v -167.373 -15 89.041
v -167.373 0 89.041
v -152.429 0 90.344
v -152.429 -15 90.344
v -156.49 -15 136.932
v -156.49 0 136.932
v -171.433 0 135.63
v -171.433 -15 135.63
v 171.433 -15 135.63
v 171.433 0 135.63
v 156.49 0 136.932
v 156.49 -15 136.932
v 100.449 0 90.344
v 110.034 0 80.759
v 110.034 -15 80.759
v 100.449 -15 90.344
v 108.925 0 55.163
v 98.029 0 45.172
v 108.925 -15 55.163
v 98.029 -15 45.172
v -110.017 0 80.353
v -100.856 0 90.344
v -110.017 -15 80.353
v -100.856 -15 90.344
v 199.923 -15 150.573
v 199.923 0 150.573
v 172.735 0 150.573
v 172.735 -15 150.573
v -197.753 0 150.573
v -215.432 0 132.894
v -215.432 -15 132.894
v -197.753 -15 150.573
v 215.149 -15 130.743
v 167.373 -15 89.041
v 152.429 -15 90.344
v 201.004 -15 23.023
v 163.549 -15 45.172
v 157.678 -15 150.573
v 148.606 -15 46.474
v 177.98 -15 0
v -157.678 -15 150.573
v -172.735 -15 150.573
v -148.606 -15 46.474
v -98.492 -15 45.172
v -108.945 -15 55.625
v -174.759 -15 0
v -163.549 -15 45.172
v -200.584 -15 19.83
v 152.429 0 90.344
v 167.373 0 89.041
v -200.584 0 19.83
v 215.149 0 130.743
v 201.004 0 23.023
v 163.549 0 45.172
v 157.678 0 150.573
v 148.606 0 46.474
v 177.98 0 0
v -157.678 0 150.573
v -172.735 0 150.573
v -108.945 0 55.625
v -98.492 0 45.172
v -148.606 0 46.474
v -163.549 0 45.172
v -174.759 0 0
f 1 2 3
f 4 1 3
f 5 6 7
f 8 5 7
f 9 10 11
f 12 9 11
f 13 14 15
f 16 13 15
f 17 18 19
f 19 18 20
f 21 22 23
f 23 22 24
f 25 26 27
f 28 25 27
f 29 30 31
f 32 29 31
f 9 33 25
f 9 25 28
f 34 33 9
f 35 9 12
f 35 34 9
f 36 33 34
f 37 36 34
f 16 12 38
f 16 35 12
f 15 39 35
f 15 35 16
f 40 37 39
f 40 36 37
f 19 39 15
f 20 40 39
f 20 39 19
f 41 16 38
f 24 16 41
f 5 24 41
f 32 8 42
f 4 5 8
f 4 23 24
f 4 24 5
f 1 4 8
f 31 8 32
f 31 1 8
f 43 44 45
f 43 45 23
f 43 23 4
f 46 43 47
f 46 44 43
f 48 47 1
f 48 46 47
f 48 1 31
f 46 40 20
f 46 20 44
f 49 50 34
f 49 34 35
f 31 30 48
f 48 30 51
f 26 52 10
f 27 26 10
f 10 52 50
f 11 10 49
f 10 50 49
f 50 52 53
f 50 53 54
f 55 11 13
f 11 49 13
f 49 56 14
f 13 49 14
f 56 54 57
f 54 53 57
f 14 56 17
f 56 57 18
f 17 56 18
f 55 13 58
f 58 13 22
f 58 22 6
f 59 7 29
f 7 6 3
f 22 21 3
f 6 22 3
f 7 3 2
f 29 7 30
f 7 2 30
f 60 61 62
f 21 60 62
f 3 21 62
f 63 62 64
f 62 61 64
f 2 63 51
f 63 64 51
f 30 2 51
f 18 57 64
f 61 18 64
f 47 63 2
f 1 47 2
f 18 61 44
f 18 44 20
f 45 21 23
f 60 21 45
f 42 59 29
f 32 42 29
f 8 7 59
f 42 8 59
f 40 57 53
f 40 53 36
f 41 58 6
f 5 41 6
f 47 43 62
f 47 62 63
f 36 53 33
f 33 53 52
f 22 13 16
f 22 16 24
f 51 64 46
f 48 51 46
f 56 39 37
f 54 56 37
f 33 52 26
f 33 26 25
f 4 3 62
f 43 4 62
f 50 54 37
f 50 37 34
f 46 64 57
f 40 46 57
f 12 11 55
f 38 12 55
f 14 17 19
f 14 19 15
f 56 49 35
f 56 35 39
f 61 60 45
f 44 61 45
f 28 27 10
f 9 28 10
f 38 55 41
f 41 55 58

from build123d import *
from OCP.BRepFilletAPI import BRepFilletAPI_MakeChamfer

# Parameters (mm, degrees)
BOSS_EXTRUDE1_DEPTH = 15
CHAMFER1_SIZE       = 10
CHAMFER1_SIZE2      = 10.462732323
CHAMFER1_SIZE2_2    = 9.593689253
CHAMFER2_SIZE       = 20
CHAMFER2_SIZE2      = 23.221000733
CHAMFER2_SIZE2_2    = 17.830293244


with BuildPart() as part:
    # Sketch2 → Boss-Extrude1 (new body)
    with BuildSketch(Plane(origin=(0, 0, 0), x_dir=(1, 0, 0), z_dir=(0, 1, 0))):
        Polygon((197.980321351, 0), (217.75302006, -150.572975632), (172.735338859, -150.572975632), (171.432941589, -135.629642818), (156.489589987, -136.932041726), (157.678475714, -150.572975632), (-157.678475714, -150.572975632), (-156.489589987, -136.932041726), (-171.432941589, -135.629642818), (-172.735338859, -150.572975632), (-217.75302006, -150.572975632), (-197.980321351, 0), align=None)
        Polygon((108.492166043, -45.171892689), (110.449460378, -90.343785379), (-110.449460378, -90.343785379), (-108.492166043, -45.171892689), align=None, mode=Mode.SUBTRACT)
        Polygon((-163.549029189, -45.171892689), (-167.372507504, -89.041386471), (-152.429155902, -90.343785379), (-148.605677588, -46.474291597), align=None, mode=Mode.SUBTRACT)
        Polygon((152.429155902, -90.343785379), (148.605677588, -46.474291597), (163.549029189, -45.171892689), (167.372507504, -89.041386471), align=None, mode=Mode.SUBTRACT)
    extrude(amount=-BOSS_EXTRUDE1_DEPTH)

    # Chamfer1: one chamfer whose edges measure the first distance from different faces: ONE call of the kernel's chamfer builder (chamfer() names one face for all edges)
    chamfer1_edges_1 = [part.edges().sort_by_distance(p)[0] for p in [
        (-108.492166043, -7.5, 45.171892689),
    ]]
    chamfer1_side_1 = [part.faces().sort_by_distance(p)[0] for p in [
        (0, -7.5, 45.171892689),
    ]]
    chamfer1_edges_2 = [part.edges().sort_by_distance(p)[0] for p in [
        (108.492166043, -7.5, 45.171892689),
    ]]
    chamfer1_side_2 = [part.faces().sort_by_distance(p)[0] for p in [
        (109.470813211, -7.5, 67.757839034),
    ]]
    chamfer1_edges_3 = [part.edges().sort_by_distance(p)[0] for p in [
        (110.449460378, -7.5, 90.343785379),
    ]]
    chamfer1_side_3 = [part.faces().sort_by_distance(p)[0] for p in [
        (0, -7.5, 90.343785379),
    ]]
    chamfer1_edges_4 = [part.edges().sort_by_distance(p)[0] for p in [
        (-110.449460378, -7.5, 90.343785379),
    ]]
    chamfer1_side_4 = [part.faces().sort_by_distance(p)[0] for p in [
        (-109.470813211, -7.5, 67.757839034),
    ]]
    chamfer1 = BRepFilletAPI_MakeChamfer(part.part.solid().wrapped)
    for e in chamfer1_edges_1:
        chamfer1.Add(CHAMFER1_SIZE, CHAMFER1_SIZE2, e.wrapped, chamfer1_side_1[0].wrapped)  # the first distance lies on this face
    for e in chamfer1_edges_2:
        chamfer1.Add(CHAMFER1_SIZE, CHAMFER1_SIZE2, e.wrapped, chamfer1_side_2[0].wrapped)  # the first distance lies on this face
    for e in chamfer1_edges_3:
        chamfer1.Add(CHAMFER1_SIZE, CHAMFER1_SIZE2_2, e.wrapped, chamfer1_side_3[0].wrapped)  # the first distance lies on this face
    for e in chamfer1_edges_4:
        chamfer1.Add(CHAMFER1_SIZE, CHAMFER1_SIZE2_2, e.wrapped, chamfer1_side_4[0].wrapped)  # the first distance lies on this face
    add(Compound.cast(chamfer1.Shape()), mode=Mode.REPLACE)

    # Chamfer2: one chamfer whose edges measure the first distance from different faces: ONE call of the kernel's chamfer builder (chamfer() names one face for all edges)
    chamfer2_edges_1 = [part.edges().sort_by_distance(p)[0] for p in [
        (197.980321351, -7.5, 0),
    ]]
    chamfer2_side_1 = [part.faces().sort_by_distance(p)[0] for p in [
        (0, -7.5, 0),
    ]]
    chamfer2_edges_2 = [part.edges().sort_by_distance(p)[0] for p in [
        (217.75302006, -7.5, 150.572975632),
    ]]
    chamfer2_side_2 = [part.faces().sort_by_distance(p)[0] for p in [
        (207.866670706, -7.5, 75.286487816),
    ]]
    chamfer2_edges_3 = [part.edges().sort_by_distance(p)[0] for p in [
        (-217.75302006, -7.5, 150.572975632),
    ]]
    chamfer2_side_3 = [part.faces().sort_by_distance(p)[0] for p in [
        (-195.24417946, -7.5, 150.572975632),
    ]]
    chamfer2_edges_4 = [part.edges().sort_by_distance(p)[0] for p in [
        (-197.980321351, -7.5, 0),
    ]]
    chamfer2_side_4 = [part.faces().sort_by_distance(p)[0] for p in [
        (-207.866670706, -7.5, 75.286487816),
    ]]
    chamfer2 = BRepFilletAPI_MakeChamfer(part.part.solid().wrapped)
    for e in chamfer2_edges_1:
        chamfer2.Add(CHAMFER2_SIZE, CHAMFER2_SIZE2, e.wrapped, chamfer2_side_1[0].wrapped)  # the first distance lies on this face
    for e in chamfer2_edges_2:
        chamfer2.Add(CHAMFER2_SIZE, CHAMFER2_SIZE2_2, e.wrapped, chamfer2_side_2[0].wrapped)  # the first distance lies on this face
    for e in chamfer2_edges_3:
        chamfer2.Add(CHAMFER2_SIZE, CHAMFER2_SIZE2_2, e.wrapped, chamfer2_side_3[0].wrapped)  # the first distance lies on this face
    for e in chamfer2_edges_4:
        chamfer2.Add(CHAMFER2_SIZE, CHAMFER2_SIZE2, e.wrapped, chamfer2_side_4[0].wrapped)  # the first distance lies on this face
    add(Compound.cast(chamfer2.Shape()), mode=Mode.REPLACE)


solid = part.part
